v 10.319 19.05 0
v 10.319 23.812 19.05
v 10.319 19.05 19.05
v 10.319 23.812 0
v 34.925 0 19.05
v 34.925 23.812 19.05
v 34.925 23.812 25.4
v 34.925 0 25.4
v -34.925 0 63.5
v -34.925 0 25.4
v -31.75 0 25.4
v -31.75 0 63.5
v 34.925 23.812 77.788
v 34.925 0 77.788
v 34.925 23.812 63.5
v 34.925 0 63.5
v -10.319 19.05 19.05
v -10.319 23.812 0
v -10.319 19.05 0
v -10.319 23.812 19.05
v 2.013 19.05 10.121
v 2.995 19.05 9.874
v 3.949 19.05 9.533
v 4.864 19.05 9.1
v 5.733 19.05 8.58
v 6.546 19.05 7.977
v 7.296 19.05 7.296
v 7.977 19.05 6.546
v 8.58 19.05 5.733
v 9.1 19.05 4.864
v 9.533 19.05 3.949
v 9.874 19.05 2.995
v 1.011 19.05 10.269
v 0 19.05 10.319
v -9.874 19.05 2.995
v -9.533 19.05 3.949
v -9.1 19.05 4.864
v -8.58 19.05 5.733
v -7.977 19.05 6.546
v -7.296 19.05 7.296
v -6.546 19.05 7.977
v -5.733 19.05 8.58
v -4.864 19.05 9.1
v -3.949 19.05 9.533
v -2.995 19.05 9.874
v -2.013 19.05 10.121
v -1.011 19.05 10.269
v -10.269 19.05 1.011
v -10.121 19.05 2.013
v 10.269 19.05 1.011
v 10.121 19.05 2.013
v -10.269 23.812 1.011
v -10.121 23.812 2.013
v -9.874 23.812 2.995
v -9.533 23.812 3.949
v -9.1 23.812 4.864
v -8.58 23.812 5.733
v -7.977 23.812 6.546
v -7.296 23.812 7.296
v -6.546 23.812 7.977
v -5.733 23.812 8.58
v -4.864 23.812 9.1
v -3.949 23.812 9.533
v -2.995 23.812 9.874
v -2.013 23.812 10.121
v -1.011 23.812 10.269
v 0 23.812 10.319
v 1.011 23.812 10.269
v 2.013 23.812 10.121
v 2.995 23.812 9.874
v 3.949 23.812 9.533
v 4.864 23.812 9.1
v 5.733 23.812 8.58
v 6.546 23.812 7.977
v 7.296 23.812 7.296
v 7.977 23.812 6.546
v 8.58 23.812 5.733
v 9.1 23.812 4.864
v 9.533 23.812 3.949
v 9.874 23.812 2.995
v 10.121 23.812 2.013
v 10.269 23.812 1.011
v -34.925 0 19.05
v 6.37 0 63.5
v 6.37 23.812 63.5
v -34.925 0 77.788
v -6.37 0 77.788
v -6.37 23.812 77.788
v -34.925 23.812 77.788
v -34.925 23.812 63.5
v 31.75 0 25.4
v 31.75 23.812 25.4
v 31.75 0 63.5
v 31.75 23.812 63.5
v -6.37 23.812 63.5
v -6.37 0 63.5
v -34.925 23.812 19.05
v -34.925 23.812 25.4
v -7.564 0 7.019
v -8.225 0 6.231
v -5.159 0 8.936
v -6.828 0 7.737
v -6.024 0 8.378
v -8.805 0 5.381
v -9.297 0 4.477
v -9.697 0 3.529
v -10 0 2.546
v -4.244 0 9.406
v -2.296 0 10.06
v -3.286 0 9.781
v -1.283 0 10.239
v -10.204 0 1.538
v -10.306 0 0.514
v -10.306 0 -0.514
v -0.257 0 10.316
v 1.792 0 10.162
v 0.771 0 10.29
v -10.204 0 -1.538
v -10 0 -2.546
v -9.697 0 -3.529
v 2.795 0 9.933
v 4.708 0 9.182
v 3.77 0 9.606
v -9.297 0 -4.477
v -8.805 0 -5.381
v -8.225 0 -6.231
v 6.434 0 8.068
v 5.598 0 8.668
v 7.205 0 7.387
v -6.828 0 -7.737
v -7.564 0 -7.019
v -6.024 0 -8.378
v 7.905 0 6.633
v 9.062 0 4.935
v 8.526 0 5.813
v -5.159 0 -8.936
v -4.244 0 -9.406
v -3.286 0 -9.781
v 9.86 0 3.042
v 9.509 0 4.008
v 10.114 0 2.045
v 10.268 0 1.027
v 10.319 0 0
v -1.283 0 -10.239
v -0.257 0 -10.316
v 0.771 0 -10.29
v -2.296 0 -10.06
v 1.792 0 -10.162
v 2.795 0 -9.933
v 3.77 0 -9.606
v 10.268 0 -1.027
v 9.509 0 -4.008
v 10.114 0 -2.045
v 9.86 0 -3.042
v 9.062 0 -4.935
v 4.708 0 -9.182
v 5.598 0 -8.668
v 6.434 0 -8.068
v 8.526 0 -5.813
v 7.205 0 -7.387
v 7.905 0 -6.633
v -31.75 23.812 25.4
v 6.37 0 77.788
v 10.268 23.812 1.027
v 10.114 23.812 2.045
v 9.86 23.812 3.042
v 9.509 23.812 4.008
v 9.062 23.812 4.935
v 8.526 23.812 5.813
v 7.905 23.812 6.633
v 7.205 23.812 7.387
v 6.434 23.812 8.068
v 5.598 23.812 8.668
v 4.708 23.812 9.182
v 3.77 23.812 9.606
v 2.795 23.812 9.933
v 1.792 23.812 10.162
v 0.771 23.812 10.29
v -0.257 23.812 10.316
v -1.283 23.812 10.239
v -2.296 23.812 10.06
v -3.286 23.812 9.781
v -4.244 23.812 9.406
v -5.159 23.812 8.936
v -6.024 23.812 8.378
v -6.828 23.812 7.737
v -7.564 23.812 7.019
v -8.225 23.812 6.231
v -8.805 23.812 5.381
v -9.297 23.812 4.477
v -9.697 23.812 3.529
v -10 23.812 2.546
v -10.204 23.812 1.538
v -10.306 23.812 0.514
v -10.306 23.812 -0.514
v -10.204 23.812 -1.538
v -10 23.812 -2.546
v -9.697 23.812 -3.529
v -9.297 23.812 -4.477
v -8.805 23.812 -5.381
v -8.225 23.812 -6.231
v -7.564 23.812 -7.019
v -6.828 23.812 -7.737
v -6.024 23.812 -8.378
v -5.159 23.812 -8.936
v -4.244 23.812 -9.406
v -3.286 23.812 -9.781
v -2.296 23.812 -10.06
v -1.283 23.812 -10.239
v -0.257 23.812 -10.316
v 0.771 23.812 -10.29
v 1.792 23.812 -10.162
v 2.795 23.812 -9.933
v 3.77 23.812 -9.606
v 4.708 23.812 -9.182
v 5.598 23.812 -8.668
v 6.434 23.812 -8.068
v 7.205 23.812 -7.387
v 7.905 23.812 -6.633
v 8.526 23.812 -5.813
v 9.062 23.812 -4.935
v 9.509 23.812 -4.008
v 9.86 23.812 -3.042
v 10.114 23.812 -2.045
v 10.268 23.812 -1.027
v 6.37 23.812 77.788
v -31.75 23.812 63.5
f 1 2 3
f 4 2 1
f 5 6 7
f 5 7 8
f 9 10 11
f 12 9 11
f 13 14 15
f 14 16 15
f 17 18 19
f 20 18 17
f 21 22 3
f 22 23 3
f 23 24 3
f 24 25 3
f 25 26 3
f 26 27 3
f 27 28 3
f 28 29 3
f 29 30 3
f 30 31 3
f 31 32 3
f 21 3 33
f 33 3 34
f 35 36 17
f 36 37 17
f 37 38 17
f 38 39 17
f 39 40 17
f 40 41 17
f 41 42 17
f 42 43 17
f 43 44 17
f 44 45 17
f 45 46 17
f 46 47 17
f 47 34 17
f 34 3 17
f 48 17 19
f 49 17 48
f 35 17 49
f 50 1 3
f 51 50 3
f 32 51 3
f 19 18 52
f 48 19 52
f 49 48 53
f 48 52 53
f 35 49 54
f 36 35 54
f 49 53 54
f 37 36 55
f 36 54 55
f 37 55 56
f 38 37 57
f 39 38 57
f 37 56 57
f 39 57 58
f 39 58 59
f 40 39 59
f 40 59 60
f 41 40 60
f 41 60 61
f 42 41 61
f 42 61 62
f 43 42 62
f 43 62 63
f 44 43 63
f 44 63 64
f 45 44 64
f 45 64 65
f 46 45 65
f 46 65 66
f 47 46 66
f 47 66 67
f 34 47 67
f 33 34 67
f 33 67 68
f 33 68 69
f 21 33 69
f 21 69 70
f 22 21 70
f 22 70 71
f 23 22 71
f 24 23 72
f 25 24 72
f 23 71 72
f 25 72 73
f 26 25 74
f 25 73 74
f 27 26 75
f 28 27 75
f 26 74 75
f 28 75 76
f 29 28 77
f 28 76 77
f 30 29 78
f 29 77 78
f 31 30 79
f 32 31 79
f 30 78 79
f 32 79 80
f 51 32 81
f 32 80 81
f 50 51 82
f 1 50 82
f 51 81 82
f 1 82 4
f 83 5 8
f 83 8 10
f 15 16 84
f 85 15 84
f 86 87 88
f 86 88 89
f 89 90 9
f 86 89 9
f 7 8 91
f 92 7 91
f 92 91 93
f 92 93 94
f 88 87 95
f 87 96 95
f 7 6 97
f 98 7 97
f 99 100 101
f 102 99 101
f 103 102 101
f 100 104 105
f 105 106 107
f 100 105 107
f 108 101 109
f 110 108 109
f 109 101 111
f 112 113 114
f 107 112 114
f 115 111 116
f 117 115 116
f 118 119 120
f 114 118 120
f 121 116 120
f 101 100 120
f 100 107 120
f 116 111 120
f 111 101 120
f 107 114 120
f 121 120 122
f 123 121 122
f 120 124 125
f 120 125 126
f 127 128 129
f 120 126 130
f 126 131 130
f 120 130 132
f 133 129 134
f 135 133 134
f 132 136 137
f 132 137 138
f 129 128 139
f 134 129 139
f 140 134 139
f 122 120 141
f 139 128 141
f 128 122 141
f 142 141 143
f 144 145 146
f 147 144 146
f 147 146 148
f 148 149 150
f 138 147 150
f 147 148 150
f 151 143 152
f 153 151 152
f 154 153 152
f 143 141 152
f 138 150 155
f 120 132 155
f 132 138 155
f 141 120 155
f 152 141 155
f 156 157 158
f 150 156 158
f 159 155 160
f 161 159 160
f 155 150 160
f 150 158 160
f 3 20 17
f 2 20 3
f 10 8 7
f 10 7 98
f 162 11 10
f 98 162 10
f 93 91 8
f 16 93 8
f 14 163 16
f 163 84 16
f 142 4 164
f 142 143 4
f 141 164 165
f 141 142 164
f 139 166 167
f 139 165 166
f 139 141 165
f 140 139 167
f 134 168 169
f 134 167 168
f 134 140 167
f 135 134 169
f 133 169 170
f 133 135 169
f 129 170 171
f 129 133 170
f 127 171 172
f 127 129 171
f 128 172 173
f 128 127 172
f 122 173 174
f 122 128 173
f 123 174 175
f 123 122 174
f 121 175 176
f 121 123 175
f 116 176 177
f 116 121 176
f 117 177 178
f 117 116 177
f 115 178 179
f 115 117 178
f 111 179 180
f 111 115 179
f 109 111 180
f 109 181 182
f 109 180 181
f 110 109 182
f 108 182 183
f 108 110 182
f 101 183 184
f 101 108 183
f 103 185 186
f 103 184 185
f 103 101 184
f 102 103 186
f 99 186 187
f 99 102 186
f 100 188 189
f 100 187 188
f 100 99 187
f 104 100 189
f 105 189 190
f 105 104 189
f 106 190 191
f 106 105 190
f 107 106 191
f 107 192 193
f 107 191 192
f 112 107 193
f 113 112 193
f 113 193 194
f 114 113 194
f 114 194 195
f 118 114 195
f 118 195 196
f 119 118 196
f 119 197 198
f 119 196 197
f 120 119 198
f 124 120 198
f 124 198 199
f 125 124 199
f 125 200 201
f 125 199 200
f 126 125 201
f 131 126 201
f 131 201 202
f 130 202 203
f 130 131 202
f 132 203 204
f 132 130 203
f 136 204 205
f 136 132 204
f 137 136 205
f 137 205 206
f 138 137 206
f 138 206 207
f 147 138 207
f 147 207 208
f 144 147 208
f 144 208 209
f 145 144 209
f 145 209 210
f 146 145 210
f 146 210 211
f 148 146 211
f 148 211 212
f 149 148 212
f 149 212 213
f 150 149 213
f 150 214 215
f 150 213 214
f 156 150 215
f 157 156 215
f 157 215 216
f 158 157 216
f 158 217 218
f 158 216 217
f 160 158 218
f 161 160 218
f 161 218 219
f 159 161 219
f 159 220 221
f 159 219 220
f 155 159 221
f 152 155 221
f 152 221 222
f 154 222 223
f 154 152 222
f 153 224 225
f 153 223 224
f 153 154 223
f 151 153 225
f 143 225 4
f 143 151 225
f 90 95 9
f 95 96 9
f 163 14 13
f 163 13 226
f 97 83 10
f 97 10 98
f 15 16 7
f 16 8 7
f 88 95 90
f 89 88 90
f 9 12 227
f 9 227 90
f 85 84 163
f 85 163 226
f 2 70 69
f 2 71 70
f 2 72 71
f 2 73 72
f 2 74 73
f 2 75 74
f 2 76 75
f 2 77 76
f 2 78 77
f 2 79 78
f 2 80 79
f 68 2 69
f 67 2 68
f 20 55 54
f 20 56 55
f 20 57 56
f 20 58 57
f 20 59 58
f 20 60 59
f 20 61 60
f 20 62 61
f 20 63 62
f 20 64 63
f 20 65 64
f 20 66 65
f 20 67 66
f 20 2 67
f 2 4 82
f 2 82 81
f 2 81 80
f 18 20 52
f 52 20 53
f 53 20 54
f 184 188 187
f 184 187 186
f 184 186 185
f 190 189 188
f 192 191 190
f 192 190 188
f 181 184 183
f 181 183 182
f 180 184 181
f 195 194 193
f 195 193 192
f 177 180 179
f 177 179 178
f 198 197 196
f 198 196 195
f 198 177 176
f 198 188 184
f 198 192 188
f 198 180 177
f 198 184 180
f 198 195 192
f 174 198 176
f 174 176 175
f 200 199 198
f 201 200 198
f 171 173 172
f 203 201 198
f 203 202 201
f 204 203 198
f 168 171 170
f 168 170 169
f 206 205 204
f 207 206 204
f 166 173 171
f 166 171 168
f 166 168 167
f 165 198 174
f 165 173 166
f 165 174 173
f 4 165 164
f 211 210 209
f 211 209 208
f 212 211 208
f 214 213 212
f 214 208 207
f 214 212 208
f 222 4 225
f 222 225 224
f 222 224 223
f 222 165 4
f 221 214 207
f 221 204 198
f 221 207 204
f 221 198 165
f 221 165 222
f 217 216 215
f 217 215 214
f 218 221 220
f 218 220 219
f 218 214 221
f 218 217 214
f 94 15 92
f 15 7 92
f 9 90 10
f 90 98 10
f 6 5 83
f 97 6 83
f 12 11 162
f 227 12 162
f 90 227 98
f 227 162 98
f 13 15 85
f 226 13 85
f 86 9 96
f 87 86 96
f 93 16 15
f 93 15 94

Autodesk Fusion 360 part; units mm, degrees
sketch "Sketch1" plane through (0, 0, 0) normal (0, 1, 0) x (1, 0, 0)
  circle A0 centre (0, 0) radius 10.3188
  dimension "d3" = 20.6375
extrude "Extrude1" add sketch "Sketch1" along normal blind 23.8125 makes body 1
sketch "Sketch2" plane through (0, 23.8125, 0) normal (0, 1, 0) x (-1, 0, 0)
  circle A0 centre (0, 0) radius 10.3188
  line L0 (-10.3188, 0) -> (10.3188, 0)
  line L1 (10.3188, 0) -> (10.3188, 19.05)
  line L2 (10.3188, 19.05) -> (-10.3188, 19.05)
  line L3 (-10.3188, 19.05) -> (-10.3188, 0)
  dimension "d15" = 20.6375
  dimension "d16" = 19.05
extrude "Extrude2" add sketch "Sketch2" against normal blind 4.7625 separate body contours A0 L1 L2 L3 makes body 2
sketch "Sketch3" plane through (0, 0, 19.05) normal (0, 0, 1) x (-1, 0, 0)
  line L0 (-10.3188, -23.8125) -> (10.3188, -23.8125)
  line L1 (10.3188, -23.8125) -> (10.3188, -19.05)
  line L2 (10.3188, -19.05) -> (-10.3188, -19.05)
  line L3 (-10.3188, -19.05) -> (-10.3188, -23.8125)
  line L4 (34.925, -23.8125) -> (-34.925, -23.8125)
  line L5 (-34.925, -23.8125) -> (-34.925, 0)
  line L6 (-34.925, 0) -> (34.925, 0)
  line L7 (34.925, 0) -> (34.925, -23.8125)
  dimension "d37" = 69.85
  dimension "d38" = 23.8125
  dimension "d39" = 34.925
extrude "Extrude5" add sketch "Sketch3" along normal blind 6.35 separate body makes body 3
sketch "Sketch4" plane through (0, 0, 25.4) normal (0, 0, 1) x (-1, 0, 0)
  line L0 (34.925, 0) -> (-34.925, 0)
  line L1 (-34.925, 0) -> (-34.925, -23.8125)
  line L2 (-34.925, -23.8125) -> (34.925, -23.8125)
  line L3 (34.925, -23.8125) -> (34.925, 0)
  line L4 (-34.925, 0) -> (-31.75, 0)
  line L5 (-31.75, 0) -> (-31.75, -23.8125)
  line L6 (-31.75, -23.8125) -> (-34.925, -23.8125)
  line L7 (-34.925, -23.8125) -> (-34.925, 0)
  line L8 (34.925, 0) -> (31.75, 0)
  line L9 (31.75, 0) -> (31.75, -23.8125)
  line L10 (31.75, -23.8125) -> (34.925, -23.8125)
  line L11 (34.925, -23.8125) -> (34.925, 0)
  dimension "d45" = 3.175
  dimension "d46" = 23.8125
  dimension "d47" = 3.175
  dimension "d48" = 23.8125
extrude "Extrude6" add sketch "Sketch4" along normal blind 38.1 separate body contours L0 L2 L3 L8 L9 L10 L11 | L0 L1 L2 L4 L5 L6 L7 makes body 4 at (-34.925, 15.875, 38.1) makes body 5 at (31.75, 7.9375, 38.1)
sketch "Sketch5" plane through (0, 0, 63.5) normal (0, 0, 1) x (-1, 0, 0)
  line L0 (-34.925, -23.8125) -> (-31.75, -23.8125)
  line L1 (-31.75, -23.8125) -> (-31.75, 0)
  line L2 (-31.75, 0) -> (-34.925, 0)
  line L3 (-34.925, 0) -> (-34.925, -23.8125)
  line L4 (-34.925, 0) -> (-6.3703, 0)
  line L5 (-6.3703, 0) -> (-6.3703, -23.8125)
  line L6 (-6.3703, -23.8125) -> (-34.925, -23.8125)
  line L7 (-34.925, -23.8125) -> (-34.925, 0)
  dimension "d54" = 28.5547
  dimension "d55" = 23.8125
sketch "Sketch6" plane through (0, 0, 63.5) normal (0, 0, 1) x (-1, 0, 0)
  line L0 (34.925, -23.8125) -> (34.925, 0)
  line L1 (34.925, 0) -> (31.75, 0)
  line L2 (31.75, 0) -> (31.75, -23.8125)
  line L3 (31.75, -23.8125) -> (34.925, -23.8125)
  line L4 (34.925, 0) -> (6.3703, 0)
  line L5 (6.3703, 0) -> (6.3703, -23.8125)
  line L6 (6.3703, -23.8125) -> (34.925, -23.8125)
  line L7 (34.925, -23.8125) -> (34.925, 0)
  dimension "d56" = 28.5547
  dimension "d57" = 23.8125
extrude "Extrude7" add sketch "Sketch5" sketch "Sketch6" along normal blind 14.2875 separate body of sketch 2 makes body 6 at (15.8885, 15.875, 63.5) makes body 7 at (-15.8885, 15.875, 63.5)
equation "D_A = 0.8125 in"
equation "L_A = 0.9375 in"
equation "d3 = D_A"
equation "d4 = L_A"
equation "b_B = D_A"
equation "L_B = 0.75 in"
equation "d15 = b_B"
equation "d16 = L_B"
equation "d17 = -H_B"
equation "L_C = L_A"
equation "d_C = 0.25 in"
equation "b_C = 2.75 in"
equation "d37 = b_C"
equation "d38 = L_C"
equation "d39 = b_C / 2"
equation "d40 = d_C"
equation "b_D = 0.125 in"
equation "d_D = 1.5 in"
equation "L_D = L_A"
equation "d45 = b_D"
equation "d46 = L_D"
equation "d47 = b_D"
equation "d48 = L_D"
equation "d49 = d_D"
equation "L_E = L_D"
equation "d_E = 0.5625 in"
equation "b_E = 1.1242 in"
equation "d54 = b_E"
equation "d55 = L_E"
equation "d56 = b_E"
equation "d57 = L_E"
equation "d58 = d_E"
equation "P = 1000 lbforce"
equation "stress = 9000 psi"
equation "H_B = ceil(( P / ( b_B * stress ) ) / 0.0625 in) * 0.0625 in"
